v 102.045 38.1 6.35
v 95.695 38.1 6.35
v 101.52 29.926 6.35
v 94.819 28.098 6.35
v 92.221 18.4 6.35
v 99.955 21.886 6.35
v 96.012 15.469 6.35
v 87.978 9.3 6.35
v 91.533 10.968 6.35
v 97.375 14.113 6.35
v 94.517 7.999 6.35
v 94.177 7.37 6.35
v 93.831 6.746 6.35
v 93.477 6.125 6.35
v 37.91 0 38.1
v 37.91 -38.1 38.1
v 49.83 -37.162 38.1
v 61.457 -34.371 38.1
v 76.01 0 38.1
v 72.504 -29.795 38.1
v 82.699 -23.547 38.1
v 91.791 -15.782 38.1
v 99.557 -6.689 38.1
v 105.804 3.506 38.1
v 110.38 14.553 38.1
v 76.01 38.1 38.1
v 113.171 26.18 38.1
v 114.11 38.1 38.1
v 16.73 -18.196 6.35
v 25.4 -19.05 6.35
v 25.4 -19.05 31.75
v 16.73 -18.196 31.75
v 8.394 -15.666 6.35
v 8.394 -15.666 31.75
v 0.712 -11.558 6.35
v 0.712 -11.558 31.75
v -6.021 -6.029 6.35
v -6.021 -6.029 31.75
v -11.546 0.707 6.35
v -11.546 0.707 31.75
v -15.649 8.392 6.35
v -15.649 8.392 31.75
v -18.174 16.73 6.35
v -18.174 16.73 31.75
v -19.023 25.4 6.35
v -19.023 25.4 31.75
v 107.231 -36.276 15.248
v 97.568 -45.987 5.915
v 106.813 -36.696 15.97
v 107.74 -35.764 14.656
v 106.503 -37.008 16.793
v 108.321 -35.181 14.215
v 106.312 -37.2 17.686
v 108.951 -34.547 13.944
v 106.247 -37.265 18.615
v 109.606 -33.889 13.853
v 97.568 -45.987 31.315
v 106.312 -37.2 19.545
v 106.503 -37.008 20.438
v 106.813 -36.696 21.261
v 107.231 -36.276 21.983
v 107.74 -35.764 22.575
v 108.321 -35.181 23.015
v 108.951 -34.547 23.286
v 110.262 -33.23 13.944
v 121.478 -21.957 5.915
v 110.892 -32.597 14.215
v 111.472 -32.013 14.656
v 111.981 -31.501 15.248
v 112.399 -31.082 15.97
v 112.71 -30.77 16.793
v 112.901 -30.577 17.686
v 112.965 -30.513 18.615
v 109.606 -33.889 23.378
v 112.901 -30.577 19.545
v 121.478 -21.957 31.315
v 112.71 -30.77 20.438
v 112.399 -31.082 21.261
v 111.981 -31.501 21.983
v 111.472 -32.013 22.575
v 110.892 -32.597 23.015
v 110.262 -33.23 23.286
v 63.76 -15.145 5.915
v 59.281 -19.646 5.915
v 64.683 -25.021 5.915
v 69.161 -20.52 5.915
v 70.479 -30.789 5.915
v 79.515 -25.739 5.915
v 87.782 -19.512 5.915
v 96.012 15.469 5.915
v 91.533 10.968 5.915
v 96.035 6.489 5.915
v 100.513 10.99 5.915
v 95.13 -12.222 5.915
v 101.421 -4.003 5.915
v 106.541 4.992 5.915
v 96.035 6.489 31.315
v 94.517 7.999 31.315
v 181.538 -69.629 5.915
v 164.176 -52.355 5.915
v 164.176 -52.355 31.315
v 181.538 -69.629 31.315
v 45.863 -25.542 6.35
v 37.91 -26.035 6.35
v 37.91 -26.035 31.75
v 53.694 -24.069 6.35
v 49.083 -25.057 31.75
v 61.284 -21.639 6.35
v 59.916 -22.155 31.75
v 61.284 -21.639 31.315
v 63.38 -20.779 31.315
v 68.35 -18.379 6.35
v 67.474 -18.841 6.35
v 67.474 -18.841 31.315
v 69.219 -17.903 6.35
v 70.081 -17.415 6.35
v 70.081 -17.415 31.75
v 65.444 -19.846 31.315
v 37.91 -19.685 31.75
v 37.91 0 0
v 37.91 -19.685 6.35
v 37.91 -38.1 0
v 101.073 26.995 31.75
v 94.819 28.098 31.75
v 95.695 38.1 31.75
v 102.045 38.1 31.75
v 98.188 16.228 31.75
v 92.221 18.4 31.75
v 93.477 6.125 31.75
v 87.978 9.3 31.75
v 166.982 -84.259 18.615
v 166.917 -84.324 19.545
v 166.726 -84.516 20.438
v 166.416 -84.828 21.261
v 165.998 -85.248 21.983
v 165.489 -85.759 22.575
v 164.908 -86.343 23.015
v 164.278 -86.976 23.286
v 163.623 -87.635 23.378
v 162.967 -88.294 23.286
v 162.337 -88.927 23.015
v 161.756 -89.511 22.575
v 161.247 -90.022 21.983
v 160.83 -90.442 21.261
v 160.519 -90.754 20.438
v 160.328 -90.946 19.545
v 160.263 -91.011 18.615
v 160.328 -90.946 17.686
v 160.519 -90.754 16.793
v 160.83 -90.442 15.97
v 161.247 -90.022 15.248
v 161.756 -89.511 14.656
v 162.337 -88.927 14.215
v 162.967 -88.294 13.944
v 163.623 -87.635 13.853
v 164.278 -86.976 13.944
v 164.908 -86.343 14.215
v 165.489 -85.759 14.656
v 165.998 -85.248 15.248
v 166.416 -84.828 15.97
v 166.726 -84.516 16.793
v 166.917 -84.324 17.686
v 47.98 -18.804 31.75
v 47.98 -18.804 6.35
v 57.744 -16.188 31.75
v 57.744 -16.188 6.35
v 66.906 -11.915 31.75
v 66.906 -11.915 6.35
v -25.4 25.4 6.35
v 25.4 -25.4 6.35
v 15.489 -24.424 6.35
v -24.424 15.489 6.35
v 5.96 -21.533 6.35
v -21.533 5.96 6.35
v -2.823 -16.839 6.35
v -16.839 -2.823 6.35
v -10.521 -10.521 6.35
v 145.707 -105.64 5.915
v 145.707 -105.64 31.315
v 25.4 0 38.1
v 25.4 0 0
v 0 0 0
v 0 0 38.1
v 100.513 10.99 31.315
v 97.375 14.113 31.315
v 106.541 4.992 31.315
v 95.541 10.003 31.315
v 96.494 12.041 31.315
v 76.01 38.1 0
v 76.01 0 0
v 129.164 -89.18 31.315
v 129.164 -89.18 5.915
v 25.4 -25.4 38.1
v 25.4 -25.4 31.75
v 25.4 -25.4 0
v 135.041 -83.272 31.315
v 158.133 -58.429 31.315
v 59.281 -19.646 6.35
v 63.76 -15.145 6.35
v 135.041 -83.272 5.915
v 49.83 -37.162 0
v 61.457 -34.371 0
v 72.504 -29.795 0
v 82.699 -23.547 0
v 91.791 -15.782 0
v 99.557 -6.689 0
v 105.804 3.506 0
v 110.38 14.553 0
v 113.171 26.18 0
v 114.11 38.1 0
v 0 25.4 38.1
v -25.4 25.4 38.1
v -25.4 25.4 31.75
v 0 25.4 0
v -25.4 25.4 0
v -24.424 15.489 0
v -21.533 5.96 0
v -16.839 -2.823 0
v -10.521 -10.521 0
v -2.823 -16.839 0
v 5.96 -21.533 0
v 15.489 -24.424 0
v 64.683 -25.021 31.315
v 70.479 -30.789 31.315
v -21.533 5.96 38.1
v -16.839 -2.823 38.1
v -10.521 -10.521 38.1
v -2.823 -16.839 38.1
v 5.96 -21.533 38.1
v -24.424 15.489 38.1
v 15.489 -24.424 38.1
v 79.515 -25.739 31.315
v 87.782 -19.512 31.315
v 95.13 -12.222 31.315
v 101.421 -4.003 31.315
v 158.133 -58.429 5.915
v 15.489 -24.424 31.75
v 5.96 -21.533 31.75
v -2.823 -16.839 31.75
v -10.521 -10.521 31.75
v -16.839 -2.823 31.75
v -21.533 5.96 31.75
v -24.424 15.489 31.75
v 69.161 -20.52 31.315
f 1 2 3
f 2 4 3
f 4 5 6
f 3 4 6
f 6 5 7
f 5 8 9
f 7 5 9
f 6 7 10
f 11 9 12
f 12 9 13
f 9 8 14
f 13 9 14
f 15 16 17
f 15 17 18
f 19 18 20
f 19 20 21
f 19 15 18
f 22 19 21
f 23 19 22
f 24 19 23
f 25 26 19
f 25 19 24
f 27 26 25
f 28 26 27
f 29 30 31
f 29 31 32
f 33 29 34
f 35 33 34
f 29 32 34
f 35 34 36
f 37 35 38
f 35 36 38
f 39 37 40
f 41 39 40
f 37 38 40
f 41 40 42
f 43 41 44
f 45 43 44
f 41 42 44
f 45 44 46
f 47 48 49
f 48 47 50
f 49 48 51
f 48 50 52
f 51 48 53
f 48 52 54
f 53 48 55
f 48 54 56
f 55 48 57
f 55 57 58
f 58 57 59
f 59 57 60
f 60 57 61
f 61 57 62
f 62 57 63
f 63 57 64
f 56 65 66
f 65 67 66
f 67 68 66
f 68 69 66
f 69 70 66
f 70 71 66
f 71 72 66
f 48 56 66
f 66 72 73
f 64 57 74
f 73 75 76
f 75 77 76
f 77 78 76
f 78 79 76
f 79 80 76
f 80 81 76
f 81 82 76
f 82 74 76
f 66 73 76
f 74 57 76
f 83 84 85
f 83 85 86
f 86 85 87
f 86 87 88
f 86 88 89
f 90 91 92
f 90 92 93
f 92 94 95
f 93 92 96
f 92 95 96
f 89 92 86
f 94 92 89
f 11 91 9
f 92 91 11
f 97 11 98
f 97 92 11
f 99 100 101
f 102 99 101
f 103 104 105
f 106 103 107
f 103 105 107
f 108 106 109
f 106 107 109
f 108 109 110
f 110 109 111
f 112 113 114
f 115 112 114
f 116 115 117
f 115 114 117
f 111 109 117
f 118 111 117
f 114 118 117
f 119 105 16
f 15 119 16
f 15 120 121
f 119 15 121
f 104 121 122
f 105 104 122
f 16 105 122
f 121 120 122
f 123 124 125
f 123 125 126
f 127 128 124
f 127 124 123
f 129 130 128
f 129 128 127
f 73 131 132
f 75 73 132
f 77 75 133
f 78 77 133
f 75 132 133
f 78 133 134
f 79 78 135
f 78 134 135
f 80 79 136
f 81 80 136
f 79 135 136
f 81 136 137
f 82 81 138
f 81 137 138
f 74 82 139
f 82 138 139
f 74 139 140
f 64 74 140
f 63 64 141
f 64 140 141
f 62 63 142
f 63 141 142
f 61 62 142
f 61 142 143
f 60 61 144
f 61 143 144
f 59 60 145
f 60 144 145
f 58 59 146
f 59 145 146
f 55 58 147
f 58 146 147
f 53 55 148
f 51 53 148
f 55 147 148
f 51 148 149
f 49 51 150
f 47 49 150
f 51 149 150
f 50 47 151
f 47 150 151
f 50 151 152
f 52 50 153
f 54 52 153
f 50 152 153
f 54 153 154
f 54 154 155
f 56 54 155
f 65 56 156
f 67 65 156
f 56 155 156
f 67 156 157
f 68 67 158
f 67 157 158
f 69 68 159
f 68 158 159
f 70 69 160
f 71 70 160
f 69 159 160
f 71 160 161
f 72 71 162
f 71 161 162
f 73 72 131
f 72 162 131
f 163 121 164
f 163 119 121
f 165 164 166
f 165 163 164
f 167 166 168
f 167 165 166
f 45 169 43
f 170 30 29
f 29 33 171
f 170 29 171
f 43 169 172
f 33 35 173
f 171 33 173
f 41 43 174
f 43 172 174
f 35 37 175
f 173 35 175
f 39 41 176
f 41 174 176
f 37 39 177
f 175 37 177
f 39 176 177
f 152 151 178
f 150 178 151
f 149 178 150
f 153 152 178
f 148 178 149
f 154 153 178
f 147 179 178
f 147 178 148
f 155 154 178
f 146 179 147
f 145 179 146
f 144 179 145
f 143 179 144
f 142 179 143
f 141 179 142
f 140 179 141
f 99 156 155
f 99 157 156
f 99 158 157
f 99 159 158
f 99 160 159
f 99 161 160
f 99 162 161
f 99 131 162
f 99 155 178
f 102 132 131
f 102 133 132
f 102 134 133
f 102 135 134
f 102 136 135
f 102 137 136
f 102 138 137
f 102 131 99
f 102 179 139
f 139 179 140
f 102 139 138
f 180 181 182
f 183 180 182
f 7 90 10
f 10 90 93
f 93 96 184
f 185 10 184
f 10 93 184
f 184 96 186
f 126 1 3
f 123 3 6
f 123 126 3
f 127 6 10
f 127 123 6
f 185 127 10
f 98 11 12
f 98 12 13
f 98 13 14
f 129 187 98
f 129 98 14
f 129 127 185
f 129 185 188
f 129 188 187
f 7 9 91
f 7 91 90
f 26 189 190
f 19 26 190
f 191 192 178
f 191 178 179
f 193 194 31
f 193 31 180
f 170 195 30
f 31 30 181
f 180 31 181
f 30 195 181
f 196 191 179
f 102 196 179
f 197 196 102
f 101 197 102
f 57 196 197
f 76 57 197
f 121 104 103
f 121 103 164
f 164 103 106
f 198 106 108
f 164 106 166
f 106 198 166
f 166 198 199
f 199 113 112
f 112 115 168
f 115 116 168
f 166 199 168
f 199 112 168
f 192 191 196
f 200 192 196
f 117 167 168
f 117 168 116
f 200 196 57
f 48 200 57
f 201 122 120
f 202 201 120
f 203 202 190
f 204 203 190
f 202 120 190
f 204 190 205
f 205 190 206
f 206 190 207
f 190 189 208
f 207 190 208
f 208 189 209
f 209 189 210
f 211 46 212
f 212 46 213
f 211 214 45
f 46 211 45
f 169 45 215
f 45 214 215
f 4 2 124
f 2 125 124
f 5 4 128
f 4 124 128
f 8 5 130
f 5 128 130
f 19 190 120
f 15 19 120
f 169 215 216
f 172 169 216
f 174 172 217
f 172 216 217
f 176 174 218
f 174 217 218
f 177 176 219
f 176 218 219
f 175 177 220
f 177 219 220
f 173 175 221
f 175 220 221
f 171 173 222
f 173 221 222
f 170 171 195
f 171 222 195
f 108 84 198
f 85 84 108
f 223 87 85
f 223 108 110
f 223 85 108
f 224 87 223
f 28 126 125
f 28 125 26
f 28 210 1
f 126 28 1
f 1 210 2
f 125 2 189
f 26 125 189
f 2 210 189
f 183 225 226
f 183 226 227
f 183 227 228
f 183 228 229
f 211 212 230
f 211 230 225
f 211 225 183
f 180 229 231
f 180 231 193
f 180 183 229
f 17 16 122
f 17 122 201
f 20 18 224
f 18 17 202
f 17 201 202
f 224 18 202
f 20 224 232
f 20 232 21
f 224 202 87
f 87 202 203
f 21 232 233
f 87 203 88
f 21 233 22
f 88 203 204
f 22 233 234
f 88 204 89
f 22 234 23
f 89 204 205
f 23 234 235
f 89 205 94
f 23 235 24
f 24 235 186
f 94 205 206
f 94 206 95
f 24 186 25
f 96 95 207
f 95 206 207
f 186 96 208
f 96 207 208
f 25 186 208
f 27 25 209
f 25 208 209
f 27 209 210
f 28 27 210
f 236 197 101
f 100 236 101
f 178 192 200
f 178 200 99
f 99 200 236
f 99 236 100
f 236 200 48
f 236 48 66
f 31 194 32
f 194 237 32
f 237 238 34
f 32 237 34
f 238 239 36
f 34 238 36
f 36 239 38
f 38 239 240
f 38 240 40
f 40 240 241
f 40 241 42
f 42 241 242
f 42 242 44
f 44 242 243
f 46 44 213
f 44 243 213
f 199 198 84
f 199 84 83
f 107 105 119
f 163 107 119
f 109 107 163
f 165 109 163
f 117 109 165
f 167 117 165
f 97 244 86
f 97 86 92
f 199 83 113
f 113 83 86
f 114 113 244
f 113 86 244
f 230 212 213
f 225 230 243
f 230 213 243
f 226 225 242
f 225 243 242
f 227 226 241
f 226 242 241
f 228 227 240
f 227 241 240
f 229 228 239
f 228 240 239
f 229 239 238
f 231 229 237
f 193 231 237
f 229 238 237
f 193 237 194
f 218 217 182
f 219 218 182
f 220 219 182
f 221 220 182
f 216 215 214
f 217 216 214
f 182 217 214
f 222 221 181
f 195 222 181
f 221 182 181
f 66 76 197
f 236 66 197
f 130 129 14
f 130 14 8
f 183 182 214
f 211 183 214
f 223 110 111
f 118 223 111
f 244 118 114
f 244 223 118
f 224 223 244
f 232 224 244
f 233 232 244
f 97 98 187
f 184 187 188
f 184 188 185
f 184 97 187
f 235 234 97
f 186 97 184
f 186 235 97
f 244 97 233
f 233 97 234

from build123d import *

# Parameters (mm, degrees)
F1_DEPTH  = 38.1
F2_W      = 6.35
F2_H      = 25.4
F3_ANGLE  = 91
F5_DEPTH  = 38.1
F6_W      = 6.35
F6_H      = 25.4
F7_ANGLE  = 30
F11_W     = 50.8
F11_H     = 25.4
F12_DEPTH = 38.1
F8_W      = 6.35
F8_H      = 25.4
F13_ANGLE = 30
F14_W     = 6.35
F14_H     = 25.4
F15_DEPTH = 7.62
F16_W     = 6.35
F16_H     = 25.4
F17_DEPTH = 6.35
F18_DEPTH = 76.2
F19_R     = 4.7625
F20_DEPTH = 76.2
F22_DEPTH = 25.4


# Not quite as in the source:
# - a feature names something its author has since deleted; it is built from what else it names


with BuildPart() as f1:
    # F0 (on Top) → F1 (new body)
    with BuildSketch(Plane.XY):
        with BuildLine():
            Line((0, 25.4), (-25.4, 25.4))
            ThreePointArc((-25.4, 25.4), (-10.5210244843, -10.5210244843), (25.4, -25.4))
            Line((25.4, -25.4), (25.4, 0))
            Line((25.4, 0), (0, 0))
            Line((0, 0), (0, 25.4))
        make_face()
    extrude(amount=F1_DEPTH)

    # F2 (on face) → F3 (revolve, cut)
    with BuildSketch(Plane.YZ.offset(25.4)):
        with Locations((-28.575, 19.05)):
            Rectangle(F2_W, F2_H)
        with Locations((-22.225, 19.05)):
            Rectangle(F2_W, F2_H)
    revolve(axis=Axis((25.4, 25.3727845848, 25.4265852273), (0, 0, -1)), revolution_arc=F3_ANGLE, mode=Mode.SUBTRACT)


with BuildPart() as f5:
    # F4 (on Top) → F5 (new body)
    with BuildSketch(Plane.XY):
        with BuildLine():
            Line((114.1095044971, 38.1), (76.0095044971, 38.1))
            Line((76.0095044971, 38.1), (76.0095044971, 0))
            Line((76.0095044971, 0), (37.9095044971, 0))
            Line((37.9095044971, 0), (37.9095044971, -38.1))
            ThreePointArc((37.9095044971, -38.1), (91.7910412235, -15.7815367264), (114.1095044971, 38.1))
        make_face()
    extrude(amount=F5_DEPTH)

    # F6 (on face) → F7 (revolve, cut)
    with BuildSketch(Plane(origin=(37.9095044971, 0, 0), x_dir=(0, -1, 0), z_dir=(-1, 0, 0))):
        with Locations((22.86, 19.05)):
            Rectangle(F6_W, F6_H)
    revolve(axis=Axis((37.9095044971, 38.3080989122, 33.1992767751), (0, 0, 1)), revolution_arc=F7_ANGLE, mode=Mode.SUBTRACT)

    # F11 (on face) → F12 (cut)
    with BuildSketch(Plane(origin=(72.0218737811, -71.6617729132, 0), x_dir=(0.7053324106, 0.7088767104, 0), z_dir=(0.7088767104, -0.7053324106, 0))):
        with Locations((53.2859638333, 18.6154339463)):
            Rectangle(F11_W, F11_H)
    extrude(amount=-F12_DEPTH, mode=Mode.SUBTRACT)

    # F8 (on face) → F13 (revolve, cut)
    with BuildSketch(Plane(origin=(0, 38.1, 0), x_dir=(-1, 0, 0), z_dir=(0, 1, 0))):
        with Locations((-98.8695044971, 19.05)):
            Rectangle(F8_W, F8_H)
    revolve(axis=Axis((38.0943529308, 38.1, 28.2714888453), (0, 0, -1)), revolution_arc=F13_ANGLE, mode=Mode.SUBTRACT)

    # F14 (on face) → F15 (cut)
    with BuildSketch(Plane(origin=(45.0136711132, -44.7886080707, 0), x_dir=(0.7053324106, 0.7088767104, 0), z_dir=(0.7088767104, -0.7053324106, 0))):
        with Locations((31.0609638333, 18.6154339463)):
            Rectangle(F14_W, F14_H)
    extrude(amount=-F15_DEPTH, mode=Mode.SUBTRACT)

    # F16 (on face) → F17 (cut)
    with BuildSketch(Plane(origin=(45.0136711132, -44.7886080707, 0), x_dir=(0.7053324106, 0.7088767104, 0), z_dir=(0.7088767104, -0.7053324106, 0))):
        with Locations((75.5109638333, 18.6154339463)):
            Rectangle(F16_W, F16_H)
    extrude(amount=-F17_DEPTH, mode=Mode.SUBTRACT)


with BuildPart() as f18:
    # F11 (on face) → F18 (new body)
    with BuildSketch(Plane(origin=(72.0218737811, -71.6617729132, 0), x_dir=(0.7053324106, 0.7088767104, 0), z_dir=(0.7088767104, -0.7053324106, 0))):
        with Locations((53.2859638333, 18.6154339463)):
            Rectangle(F11_W, F11_H)
    extrude(amount=F18_DEPTH)

    # F19 (on face) → F20 (cut)
    with BuildSketch(Plane(origin=(126.038279117, -125.408102598, 0), x_dir=(0.7053324106, 0.7088767104, 0), z_dir=(0.7088767104, -0.7053324106, 0))):
        with Locations((53.2859638333, 18.6154339463)):
            Circle(F19_R)
    extrude(amount=-F20_DEPTH, mode=Mode.SUBTRACT)

    # F21 (on face) → F22 (cut)
    with BuildSketch(Plane.XY.offset(31.3154339463)):
        Polygon((135.04124021, -83.2723715078), (97.5683920804, -45.9868831958), (91.6907478725, -51.8940626034), (129.1635960022, -89.1795509154), align=None)
        Polygon((127.5216343291, -15.8831257129), (121.4778258094, -21.9573044091), (158.1326163355, -58.428825309), (164.1764248552, -52.3546466128), align=None)
    extrude(amount=-F22_DEPTH, mode=Mode.SUBTRACT)


solid = Compound([f1.part, f5.part, f18.part])
